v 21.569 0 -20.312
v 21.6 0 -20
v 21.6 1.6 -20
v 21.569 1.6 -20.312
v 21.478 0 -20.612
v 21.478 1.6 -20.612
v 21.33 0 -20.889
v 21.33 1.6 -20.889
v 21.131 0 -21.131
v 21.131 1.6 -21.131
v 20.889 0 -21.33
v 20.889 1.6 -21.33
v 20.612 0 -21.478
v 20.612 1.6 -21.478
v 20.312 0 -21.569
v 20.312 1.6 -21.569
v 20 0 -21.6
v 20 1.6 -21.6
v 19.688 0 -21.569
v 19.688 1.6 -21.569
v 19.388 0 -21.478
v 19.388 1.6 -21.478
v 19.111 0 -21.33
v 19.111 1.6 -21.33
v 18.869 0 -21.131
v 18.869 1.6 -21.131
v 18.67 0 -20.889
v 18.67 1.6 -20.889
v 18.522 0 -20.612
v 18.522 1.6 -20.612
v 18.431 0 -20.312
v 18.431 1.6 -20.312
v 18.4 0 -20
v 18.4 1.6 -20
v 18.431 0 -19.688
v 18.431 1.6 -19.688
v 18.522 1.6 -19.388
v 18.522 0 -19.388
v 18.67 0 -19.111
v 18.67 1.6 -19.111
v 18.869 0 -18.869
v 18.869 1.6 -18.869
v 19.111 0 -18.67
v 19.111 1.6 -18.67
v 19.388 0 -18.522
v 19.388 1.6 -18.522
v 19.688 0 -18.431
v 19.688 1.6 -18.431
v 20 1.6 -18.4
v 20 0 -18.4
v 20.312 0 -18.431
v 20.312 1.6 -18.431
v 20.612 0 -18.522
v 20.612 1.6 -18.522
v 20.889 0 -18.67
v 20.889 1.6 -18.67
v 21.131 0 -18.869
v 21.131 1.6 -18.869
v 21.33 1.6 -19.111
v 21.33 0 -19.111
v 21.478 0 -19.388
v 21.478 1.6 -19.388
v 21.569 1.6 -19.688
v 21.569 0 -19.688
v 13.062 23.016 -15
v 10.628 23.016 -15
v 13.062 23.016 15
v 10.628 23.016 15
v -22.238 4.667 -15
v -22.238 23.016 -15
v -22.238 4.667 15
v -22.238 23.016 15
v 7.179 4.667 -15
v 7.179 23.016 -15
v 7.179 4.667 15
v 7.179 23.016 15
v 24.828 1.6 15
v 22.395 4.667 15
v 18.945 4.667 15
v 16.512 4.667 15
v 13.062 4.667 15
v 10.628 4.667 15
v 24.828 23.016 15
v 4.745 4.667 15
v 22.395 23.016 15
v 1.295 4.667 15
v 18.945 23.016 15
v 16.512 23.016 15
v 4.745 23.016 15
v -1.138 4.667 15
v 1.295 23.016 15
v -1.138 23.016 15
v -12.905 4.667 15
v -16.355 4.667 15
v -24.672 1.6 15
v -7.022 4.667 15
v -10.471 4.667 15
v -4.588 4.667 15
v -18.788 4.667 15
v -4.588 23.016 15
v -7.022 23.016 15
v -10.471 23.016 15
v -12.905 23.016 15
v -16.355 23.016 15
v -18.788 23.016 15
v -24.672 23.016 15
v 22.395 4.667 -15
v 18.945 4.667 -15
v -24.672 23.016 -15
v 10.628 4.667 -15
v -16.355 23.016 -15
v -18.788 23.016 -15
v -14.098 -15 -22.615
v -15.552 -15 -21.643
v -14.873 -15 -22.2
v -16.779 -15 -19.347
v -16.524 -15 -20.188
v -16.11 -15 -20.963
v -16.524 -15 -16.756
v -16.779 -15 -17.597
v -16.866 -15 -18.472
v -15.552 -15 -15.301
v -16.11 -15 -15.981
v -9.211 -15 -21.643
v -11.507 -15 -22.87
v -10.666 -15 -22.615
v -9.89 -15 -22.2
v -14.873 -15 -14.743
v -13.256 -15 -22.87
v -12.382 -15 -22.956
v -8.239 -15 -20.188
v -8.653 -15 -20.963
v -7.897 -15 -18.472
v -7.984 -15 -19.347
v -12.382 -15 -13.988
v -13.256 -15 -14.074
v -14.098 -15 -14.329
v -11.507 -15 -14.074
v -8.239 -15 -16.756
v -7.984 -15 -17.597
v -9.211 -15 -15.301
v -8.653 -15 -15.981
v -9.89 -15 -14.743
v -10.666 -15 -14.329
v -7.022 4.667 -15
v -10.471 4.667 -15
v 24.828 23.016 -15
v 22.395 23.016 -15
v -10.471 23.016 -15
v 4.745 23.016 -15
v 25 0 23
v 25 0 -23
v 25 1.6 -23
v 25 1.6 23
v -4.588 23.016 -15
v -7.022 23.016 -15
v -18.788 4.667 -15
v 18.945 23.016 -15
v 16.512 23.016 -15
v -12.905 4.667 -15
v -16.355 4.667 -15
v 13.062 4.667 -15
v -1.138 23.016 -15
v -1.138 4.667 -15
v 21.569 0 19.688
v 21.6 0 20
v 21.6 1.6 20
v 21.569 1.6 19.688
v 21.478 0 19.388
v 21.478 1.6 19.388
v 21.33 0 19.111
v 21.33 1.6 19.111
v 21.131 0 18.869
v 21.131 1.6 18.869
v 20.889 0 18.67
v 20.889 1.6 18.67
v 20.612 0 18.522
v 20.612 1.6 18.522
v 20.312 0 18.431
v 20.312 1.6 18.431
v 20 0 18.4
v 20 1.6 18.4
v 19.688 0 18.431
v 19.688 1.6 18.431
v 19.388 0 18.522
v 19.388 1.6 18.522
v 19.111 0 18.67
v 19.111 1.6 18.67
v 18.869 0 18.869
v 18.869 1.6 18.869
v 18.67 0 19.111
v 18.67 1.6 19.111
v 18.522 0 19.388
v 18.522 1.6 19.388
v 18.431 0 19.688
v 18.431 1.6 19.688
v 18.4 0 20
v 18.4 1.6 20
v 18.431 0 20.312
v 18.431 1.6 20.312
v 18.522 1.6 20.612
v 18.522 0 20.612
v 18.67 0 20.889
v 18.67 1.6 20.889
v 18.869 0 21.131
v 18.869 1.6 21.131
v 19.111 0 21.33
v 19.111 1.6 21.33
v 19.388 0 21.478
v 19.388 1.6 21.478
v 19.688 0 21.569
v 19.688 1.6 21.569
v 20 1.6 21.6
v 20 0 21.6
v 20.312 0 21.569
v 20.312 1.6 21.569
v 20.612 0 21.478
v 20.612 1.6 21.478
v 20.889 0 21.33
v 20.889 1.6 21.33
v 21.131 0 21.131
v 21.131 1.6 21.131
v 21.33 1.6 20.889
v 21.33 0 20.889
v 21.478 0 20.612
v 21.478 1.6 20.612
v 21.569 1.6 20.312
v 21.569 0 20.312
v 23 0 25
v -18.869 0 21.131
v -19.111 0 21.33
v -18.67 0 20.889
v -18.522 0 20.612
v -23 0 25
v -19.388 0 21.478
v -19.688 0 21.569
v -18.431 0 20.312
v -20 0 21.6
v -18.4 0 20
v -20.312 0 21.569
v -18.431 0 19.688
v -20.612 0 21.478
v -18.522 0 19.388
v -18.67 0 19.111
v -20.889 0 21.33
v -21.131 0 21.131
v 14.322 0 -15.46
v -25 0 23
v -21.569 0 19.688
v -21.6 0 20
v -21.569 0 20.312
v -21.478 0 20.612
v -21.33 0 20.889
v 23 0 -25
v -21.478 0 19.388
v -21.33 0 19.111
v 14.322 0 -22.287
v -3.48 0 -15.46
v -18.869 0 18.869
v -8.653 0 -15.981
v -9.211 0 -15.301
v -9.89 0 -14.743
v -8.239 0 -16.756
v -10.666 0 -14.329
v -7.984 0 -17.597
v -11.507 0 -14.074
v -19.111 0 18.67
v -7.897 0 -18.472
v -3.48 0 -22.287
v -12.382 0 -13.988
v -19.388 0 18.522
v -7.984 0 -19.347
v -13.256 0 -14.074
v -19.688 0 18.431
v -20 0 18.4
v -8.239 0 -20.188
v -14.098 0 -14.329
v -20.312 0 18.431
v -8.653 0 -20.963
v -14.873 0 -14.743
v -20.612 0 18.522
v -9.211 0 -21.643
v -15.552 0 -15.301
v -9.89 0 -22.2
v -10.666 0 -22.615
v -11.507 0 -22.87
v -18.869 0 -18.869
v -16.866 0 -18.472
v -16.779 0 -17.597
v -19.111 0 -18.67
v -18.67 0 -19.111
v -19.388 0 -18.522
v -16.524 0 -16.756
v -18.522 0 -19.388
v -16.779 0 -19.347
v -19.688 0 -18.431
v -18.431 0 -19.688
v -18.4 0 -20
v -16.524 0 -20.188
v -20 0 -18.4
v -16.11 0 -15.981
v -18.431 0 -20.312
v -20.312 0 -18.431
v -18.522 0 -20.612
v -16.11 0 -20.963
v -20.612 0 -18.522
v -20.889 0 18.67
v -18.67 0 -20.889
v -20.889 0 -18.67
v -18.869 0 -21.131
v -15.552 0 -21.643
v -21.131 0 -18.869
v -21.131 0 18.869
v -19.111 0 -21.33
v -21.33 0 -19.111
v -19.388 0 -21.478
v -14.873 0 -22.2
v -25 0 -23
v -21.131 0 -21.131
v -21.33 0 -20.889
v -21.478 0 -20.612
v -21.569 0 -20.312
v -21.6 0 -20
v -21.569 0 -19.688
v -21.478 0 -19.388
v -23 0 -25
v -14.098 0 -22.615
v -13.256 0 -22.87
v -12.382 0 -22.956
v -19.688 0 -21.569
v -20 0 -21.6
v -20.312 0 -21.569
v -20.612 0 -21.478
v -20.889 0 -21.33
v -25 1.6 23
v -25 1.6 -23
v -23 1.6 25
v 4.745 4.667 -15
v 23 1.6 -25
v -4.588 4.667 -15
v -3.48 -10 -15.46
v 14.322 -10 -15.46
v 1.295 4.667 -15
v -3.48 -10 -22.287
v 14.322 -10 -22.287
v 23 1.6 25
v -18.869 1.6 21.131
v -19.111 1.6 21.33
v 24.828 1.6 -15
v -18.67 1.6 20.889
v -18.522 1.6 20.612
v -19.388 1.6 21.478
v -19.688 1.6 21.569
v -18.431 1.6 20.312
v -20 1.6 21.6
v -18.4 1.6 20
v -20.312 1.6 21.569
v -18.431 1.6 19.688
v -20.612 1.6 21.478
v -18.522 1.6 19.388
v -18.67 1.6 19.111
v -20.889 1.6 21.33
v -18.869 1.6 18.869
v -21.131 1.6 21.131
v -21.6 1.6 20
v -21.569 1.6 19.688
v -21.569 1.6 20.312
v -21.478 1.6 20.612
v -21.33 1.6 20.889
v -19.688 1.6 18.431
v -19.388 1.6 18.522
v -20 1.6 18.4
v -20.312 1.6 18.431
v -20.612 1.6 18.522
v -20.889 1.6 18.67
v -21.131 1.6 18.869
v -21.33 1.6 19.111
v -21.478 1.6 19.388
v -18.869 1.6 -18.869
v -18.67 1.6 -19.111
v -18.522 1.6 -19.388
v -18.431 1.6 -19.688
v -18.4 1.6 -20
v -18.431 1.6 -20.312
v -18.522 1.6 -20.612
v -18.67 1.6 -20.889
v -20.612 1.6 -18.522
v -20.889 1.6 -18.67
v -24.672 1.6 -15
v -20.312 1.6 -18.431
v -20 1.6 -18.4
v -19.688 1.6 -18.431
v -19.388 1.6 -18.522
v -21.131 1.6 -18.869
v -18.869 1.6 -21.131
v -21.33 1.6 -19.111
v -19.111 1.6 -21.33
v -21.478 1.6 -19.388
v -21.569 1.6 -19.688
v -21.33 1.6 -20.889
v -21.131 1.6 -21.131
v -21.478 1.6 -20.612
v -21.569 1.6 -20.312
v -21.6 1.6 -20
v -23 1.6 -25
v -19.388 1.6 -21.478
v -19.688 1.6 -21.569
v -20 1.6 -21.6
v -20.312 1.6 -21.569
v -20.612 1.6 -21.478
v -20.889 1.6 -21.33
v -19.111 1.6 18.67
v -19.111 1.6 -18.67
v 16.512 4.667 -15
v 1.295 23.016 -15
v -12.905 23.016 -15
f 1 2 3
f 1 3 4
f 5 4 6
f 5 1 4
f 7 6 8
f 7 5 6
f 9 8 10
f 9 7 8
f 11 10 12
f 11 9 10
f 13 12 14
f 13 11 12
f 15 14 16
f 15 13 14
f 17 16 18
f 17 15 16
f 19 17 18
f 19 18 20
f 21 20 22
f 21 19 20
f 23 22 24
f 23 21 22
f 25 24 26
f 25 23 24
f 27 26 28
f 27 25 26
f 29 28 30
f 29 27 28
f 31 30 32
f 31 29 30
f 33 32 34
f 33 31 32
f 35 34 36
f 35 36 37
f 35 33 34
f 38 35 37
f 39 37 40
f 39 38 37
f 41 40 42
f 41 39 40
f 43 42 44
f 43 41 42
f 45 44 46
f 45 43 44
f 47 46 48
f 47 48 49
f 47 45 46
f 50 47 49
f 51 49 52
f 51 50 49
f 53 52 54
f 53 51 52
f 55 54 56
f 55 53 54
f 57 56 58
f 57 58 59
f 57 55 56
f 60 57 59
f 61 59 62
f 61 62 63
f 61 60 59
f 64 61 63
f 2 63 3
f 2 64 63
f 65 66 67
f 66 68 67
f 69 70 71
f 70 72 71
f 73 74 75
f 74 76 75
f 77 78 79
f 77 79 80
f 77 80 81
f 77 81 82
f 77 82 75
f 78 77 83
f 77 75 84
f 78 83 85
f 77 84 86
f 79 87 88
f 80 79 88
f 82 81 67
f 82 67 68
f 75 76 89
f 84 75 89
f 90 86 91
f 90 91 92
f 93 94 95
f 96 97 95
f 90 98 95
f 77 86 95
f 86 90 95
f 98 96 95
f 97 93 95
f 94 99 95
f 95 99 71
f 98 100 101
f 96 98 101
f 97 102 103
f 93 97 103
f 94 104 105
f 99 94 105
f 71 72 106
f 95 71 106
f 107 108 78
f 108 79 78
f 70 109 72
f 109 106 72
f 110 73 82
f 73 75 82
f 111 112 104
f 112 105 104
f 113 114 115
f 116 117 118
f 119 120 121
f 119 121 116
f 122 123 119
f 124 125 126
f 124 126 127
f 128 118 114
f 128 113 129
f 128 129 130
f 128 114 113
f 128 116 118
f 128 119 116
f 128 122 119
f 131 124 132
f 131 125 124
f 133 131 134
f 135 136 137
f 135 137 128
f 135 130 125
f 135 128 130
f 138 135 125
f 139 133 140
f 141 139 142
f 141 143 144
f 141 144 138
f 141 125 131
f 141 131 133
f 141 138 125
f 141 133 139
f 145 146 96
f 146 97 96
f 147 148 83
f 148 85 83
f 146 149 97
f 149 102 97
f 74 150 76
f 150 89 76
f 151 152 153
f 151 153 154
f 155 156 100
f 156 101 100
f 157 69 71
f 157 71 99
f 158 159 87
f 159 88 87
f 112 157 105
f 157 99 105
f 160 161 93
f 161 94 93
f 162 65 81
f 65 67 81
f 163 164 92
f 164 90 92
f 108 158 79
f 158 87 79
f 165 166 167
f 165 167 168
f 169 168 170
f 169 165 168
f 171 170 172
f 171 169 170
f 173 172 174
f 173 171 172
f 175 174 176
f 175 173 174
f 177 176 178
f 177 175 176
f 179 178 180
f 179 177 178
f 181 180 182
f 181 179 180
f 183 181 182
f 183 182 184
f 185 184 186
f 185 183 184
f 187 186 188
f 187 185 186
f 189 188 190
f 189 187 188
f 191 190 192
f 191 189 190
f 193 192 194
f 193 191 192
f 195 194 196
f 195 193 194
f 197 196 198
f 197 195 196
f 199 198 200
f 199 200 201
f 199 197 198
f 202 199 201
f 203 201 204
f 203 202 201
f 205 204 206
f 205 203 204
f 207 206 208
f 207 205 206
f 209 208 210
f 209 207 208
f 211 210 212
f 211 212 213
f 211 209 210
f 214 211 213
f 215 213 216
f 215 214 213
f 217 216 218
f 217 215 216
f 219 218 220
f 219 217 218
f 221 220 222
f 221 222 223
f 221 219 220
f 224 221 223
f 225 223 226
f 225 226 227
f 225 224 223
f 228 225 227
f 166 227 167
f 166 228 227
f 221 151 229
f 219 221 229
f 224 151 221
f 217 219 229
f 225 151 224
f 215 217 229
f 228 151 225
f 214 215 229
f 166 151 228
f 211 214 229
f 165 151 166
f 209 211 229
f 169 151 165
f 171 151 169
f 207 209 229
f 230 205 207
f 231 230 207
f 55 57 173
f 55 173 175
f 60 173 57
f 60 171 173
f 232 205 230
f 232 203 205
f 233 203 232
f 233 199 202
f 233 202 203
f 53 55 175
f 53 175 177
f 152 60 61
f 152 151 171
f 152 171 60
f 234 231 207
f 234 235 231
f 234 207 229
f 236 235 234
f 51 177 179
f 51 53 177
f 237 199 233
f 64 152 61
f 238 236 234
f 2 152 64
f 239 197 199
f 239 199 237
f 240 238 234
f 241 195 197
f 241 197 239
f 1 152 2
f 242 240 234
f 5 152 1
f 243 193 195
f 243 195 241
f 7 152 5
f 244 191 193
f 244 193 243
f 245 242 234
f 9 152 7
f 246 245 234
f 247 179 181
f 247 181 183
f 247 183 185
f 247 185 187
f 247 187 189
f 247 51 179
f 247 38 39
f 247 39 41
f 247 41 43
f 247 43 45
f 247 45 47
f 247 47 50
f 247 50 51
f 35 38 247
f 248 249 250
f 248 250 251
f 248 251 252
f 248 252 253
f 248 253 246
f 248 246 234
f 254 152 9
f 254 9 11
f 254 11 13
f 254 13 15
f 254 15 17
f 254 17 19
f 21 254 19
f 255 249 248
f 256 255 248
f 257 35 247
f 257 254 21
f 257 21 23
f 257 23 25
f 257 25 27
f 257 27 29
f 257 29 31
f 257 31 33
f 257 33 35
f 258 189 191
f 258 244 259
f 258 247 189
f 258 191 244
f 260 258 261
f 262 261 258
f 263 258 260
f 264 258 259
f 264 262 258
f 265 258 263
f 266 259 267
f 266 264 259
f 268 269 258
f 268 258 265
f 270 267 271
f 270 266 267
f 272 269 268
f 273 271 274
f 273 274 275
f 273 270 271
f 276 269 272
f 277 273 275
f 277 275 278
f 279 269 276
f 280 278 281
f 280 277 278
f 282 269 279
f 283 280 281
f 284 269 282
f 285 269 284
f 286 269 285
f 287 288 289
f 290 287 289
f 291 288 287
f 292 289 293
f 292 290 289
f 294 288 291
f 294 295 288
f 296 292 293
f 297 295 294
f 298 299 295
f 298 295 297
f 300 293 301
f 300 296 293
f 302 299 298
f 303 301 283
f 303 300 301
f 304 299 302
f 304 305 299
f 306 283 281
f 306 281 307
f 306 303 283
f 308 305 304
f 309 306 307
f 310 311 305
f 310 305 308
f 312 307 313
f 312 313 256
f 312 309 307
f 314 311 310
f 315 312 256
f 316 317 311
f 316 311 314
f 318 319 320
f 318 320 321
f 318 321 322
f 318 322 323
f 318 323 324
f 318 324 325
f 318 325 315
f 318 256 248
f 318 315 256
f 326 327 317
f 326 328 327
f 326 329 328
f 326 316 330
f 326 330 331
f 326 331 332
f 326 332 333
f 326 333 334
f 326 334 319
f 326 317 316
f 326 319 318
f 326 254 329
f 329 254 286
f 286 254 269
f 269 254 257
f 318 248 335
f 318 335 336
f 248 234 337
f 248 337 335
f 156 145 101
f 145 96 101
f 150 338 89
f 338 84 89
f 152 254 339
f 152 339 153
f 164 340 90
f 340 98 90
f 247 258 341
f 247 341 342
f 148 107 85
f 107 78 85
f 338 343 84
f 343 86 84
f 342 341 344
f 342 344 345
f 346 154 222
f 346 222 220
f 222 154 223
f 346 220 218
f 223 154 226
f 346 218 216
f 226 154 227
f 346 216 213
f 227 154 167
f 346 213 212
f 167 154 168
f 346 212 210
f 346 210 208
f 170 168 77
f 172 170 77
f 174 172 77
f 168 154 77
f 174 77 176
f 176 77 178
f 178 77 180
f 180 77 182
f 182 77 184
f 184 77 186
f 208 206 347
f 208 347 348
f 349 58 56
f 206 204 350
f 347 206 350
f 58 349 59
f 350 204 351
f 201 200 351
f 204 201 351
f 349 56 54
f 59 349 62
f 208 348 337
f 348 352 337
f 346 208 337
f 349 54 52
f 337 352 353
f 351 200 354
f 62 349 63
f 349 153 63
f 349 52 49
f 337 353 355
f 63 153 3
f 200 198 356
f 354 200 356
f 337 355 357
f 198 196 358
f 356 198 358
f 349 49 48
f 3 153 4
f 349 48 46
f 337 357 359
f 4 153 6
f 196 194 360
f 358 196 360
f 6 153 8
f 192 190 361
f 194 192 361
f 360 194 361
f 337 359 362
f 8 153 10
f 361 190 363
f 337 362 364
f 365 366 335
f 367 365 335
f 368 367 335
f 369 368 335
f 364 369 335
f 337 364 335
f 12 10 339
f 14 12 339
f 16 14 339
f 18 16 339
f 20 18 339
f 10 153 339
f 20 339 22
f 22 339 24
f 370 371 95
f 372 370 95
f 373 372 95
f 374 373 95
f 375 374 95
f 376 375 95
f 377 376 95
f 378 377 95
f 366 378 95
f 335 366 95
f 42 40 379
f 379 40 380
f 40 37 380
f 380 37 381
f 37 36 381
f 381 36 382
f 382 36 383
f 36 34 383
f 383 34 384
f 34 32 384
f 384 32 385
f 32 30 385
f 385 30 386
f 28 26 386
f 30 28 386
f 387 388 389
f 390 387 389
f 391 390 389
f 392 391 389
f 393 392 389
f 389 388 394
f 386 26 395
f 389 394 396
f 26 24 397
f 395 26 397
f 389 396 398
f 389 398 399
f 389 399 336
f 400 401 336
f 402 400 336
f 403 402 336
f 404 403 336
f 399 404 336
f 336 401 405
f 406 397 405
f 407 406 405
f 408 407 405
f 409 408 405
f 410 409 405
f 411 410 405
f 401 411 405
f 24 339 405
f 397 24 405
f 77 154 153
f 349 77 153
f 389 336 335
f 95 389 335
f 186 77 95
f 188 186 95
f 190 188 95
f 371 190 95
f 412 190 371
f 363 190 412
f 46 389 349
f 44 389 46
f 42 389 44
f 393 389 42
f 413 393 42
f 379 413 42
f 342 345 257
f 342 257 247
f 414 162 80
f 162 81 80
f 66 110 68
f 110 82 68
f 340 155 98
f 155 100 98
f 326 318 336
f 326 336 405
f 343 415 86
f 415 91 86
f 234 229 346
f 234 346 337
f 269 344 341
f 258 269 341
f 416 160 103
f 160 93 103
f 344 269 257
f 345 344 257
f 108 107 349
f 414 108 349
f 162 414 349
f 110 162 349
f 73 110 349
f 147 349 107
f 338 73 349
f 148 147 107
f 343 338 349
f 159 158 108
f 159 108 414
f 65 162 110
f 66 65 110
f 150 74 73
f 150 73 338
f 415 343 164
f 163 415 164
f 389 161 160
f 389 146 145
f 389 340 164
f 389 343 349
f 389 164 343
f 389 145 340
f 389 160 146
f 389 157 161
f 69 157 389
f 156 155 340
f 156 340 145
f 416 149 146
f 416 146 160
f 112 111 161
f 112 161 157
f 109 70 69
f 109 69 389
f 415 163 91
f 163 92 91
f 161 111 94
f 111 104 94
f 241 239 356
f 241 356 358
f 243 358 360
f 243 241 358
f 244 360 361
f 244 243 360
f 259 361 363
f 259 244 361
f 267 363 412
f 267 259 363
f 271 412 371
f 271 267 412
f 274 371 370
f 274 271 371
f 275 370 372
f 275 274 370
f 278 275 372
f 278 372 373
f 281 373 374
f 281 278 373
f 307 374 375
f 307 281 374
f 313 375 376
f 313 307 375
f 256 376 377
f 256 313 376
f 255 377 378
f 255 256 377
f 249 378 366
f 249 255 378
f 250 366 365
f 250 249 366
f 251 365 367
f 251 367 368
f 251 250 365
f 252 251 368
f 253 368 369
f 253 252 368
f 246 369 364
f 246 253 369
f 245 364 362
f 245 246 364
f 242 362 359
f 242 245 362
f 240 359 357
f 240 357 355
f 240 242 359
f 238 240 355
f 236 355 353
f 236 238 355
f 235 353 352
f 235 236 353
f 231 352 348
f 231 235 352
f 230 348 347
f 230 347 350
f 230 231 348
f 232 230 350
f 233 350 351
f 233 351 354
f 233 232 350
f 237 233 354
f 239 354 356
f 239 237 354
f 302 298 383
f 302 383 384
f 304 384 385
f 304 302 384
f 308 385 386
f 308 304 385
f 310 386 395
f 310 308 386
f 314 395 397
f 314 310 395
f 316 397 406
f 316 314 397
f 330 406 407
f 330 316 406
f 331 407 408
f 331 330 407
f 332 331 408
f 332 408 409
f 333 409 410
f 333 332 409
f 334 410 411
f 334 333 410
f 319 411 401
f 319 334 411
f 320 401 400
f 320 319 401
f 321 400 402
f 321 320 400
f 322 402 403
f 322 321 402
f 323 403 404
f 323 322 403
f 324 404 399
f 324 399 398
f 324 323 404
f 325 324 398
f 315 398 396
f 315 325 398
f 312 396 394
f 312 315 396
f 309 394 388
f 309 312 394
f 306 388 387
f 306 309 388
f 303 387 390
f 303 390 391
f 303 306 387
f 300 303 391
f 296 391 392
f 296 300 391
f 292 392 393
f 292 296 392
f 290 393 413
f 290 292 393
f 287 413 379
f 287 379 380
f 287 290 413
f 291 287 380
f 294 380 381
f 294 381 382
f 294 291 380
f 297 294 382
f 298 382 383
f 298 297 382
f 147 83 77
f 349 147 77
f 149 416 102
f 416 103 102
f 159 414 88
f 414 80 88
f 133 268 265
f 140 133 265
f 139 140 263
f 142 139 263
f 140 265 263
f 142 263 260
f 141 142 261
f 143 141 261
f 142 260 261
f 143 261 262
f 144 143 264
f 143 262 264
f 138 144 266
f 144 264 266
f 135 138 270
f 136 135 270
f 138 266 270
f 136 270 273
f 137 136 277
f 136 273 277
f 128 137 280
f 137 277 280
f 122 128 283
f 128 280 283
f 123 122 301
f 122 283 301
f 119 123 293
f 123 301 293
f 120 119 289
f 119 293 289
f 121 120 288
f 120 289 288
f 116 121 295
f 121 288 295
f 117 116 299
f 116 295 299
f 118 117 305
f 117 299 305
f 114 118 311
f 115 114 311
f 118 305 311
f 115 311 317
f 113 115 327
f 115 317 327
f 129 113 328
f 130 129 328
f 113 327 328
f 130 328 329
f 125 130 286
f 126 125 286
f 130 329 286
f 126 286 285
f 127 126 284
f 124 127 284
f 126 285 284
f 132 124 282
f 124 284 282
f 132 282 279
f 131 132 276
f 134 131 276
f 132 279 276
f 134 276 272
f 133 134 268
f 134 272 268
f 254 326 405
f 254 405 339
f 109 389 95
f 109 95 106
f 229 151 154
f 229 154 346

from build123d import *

# Parameters (mm, degrees)
SKETCH1_R                = 1.6
BOSS_EXTRUDE1_DEPTH      = 1.6
BOSS_EXTRUDE2_DEPTH      = 15
BOSS_EXTRUDE2_DEPTH_BACK = 15
SKETCH3_R                = 4.484115481
BOSS_EXTRUDE3_DEPTH      = 15
SKETCH4_W                = 17.802607731
SKETCH4_H                = 6.826563867
BOSS_EXTRUDE4_DEPTH      = 10


with BuildPart() as part:
    # Sketch1 → Boss-Extrude1 (new body)
    with BuildSketch(Plane(origin=(0, 0, 0), x_dir=(1, 0, 0), z_dir=(0, 1, 0))):
        Polygon((-25, 23), (-23, 25), (23, 25), (25, 23), (25, -23), (23, -25), (-23, -25), (-25, -23), align=None)
        with Locations((20, 20)):
            Circle(SKETCH1_R, mode=Mode.SUBTRACT)
        with Locations((-20, 20)):
            Circle(SKETCH1_R, mode=Mode.SUBTRACT)
        with Locations((-20, -20)):
            Circle(SKETCH1_R, mode=Mode.SUBTRACT)
        with Locations((20, -20)):
            Circle(SKETCH1_R, mode=Mode.SUBTRACT)
    extrude(amount=BOSS_EXTRUDE1_DEPTH)

    # Sketch2 → Boss-Extrude2 (add, two sides)
    with BuildSketch(Plane.XY) as boss_extrude2_sk:
        Polygon((-24.671549394, 1.6), (-24.671549394, 23.015646785), (-22.237958156, 23.015646785), (-22.237958156, 4.666777426), (-18.788248299, 4.666777426), (-18.788248299, 23.015646785), (-16.354657061, 23.015646785), (-16.354657061, 4.666777426), (-12.904947204, 4.666777426), (-12.904947204, 23.015646785), (-10.471355966, 23.015646785), (-10.471355966, 4.666777426), (-7.021646108, 4.666777426), (-7.021646108, 23.015646785), (-4.588054871, 23.015646785), (-4.588054871, 4.666777426), (-1.138345013, 4.666777426), (-1.138345013, 23.015646785), (1.295246225, 23.015646785), (1.295246225, 4.666777426), (4.744956082, 4.666777426), (4.744956082, 23.015646785), (7.17854732, 23.015646785), (7.17854732, 4.666777426), (10.628257178, 4.666777426), (10.628257178, 23.015646785), (13.061848415, 23.015646785), (13.061848415, 4.666777426), (16.511558273, 4.666777426), (16.511558273, 23.015646785), (18.945149511, 23.015646785), (18.945149511, 4.666777426), (22.394859368, 4.666777426), (22.394859368, 23.015646785), (24.828450606, 23.015646785), (24.828450606, 1.6), align=None)
    extrude(amount=BOSS_EXTRUDE2_DEPTH)
    extrude(boss_extrude2_sk.sketch, amount=-BOSS_EXTRUDE2_DEPTH_BACK)

    # Sketch3 → Boss-Extrude3 (add)
    with BuildSketch(Plane.XZ):
        with Locations((-12.381512895, -18.471878698)):
            Circle(SKETCH3_R)
    extrude(amount=BOSS_EXTRUDE3_DEPTH)

    # Sketch4 → Boss-Extrude4 (add)
    with BuildSketch(Plane.XZ):
        with Locations((5.421094835, -18.873441279)):
            Rectangle(SKETCH4_W, SKETCH4_H)
    extrude(amount=BOSS_EXTRUDE4_DEPTH)


solid = part.part
